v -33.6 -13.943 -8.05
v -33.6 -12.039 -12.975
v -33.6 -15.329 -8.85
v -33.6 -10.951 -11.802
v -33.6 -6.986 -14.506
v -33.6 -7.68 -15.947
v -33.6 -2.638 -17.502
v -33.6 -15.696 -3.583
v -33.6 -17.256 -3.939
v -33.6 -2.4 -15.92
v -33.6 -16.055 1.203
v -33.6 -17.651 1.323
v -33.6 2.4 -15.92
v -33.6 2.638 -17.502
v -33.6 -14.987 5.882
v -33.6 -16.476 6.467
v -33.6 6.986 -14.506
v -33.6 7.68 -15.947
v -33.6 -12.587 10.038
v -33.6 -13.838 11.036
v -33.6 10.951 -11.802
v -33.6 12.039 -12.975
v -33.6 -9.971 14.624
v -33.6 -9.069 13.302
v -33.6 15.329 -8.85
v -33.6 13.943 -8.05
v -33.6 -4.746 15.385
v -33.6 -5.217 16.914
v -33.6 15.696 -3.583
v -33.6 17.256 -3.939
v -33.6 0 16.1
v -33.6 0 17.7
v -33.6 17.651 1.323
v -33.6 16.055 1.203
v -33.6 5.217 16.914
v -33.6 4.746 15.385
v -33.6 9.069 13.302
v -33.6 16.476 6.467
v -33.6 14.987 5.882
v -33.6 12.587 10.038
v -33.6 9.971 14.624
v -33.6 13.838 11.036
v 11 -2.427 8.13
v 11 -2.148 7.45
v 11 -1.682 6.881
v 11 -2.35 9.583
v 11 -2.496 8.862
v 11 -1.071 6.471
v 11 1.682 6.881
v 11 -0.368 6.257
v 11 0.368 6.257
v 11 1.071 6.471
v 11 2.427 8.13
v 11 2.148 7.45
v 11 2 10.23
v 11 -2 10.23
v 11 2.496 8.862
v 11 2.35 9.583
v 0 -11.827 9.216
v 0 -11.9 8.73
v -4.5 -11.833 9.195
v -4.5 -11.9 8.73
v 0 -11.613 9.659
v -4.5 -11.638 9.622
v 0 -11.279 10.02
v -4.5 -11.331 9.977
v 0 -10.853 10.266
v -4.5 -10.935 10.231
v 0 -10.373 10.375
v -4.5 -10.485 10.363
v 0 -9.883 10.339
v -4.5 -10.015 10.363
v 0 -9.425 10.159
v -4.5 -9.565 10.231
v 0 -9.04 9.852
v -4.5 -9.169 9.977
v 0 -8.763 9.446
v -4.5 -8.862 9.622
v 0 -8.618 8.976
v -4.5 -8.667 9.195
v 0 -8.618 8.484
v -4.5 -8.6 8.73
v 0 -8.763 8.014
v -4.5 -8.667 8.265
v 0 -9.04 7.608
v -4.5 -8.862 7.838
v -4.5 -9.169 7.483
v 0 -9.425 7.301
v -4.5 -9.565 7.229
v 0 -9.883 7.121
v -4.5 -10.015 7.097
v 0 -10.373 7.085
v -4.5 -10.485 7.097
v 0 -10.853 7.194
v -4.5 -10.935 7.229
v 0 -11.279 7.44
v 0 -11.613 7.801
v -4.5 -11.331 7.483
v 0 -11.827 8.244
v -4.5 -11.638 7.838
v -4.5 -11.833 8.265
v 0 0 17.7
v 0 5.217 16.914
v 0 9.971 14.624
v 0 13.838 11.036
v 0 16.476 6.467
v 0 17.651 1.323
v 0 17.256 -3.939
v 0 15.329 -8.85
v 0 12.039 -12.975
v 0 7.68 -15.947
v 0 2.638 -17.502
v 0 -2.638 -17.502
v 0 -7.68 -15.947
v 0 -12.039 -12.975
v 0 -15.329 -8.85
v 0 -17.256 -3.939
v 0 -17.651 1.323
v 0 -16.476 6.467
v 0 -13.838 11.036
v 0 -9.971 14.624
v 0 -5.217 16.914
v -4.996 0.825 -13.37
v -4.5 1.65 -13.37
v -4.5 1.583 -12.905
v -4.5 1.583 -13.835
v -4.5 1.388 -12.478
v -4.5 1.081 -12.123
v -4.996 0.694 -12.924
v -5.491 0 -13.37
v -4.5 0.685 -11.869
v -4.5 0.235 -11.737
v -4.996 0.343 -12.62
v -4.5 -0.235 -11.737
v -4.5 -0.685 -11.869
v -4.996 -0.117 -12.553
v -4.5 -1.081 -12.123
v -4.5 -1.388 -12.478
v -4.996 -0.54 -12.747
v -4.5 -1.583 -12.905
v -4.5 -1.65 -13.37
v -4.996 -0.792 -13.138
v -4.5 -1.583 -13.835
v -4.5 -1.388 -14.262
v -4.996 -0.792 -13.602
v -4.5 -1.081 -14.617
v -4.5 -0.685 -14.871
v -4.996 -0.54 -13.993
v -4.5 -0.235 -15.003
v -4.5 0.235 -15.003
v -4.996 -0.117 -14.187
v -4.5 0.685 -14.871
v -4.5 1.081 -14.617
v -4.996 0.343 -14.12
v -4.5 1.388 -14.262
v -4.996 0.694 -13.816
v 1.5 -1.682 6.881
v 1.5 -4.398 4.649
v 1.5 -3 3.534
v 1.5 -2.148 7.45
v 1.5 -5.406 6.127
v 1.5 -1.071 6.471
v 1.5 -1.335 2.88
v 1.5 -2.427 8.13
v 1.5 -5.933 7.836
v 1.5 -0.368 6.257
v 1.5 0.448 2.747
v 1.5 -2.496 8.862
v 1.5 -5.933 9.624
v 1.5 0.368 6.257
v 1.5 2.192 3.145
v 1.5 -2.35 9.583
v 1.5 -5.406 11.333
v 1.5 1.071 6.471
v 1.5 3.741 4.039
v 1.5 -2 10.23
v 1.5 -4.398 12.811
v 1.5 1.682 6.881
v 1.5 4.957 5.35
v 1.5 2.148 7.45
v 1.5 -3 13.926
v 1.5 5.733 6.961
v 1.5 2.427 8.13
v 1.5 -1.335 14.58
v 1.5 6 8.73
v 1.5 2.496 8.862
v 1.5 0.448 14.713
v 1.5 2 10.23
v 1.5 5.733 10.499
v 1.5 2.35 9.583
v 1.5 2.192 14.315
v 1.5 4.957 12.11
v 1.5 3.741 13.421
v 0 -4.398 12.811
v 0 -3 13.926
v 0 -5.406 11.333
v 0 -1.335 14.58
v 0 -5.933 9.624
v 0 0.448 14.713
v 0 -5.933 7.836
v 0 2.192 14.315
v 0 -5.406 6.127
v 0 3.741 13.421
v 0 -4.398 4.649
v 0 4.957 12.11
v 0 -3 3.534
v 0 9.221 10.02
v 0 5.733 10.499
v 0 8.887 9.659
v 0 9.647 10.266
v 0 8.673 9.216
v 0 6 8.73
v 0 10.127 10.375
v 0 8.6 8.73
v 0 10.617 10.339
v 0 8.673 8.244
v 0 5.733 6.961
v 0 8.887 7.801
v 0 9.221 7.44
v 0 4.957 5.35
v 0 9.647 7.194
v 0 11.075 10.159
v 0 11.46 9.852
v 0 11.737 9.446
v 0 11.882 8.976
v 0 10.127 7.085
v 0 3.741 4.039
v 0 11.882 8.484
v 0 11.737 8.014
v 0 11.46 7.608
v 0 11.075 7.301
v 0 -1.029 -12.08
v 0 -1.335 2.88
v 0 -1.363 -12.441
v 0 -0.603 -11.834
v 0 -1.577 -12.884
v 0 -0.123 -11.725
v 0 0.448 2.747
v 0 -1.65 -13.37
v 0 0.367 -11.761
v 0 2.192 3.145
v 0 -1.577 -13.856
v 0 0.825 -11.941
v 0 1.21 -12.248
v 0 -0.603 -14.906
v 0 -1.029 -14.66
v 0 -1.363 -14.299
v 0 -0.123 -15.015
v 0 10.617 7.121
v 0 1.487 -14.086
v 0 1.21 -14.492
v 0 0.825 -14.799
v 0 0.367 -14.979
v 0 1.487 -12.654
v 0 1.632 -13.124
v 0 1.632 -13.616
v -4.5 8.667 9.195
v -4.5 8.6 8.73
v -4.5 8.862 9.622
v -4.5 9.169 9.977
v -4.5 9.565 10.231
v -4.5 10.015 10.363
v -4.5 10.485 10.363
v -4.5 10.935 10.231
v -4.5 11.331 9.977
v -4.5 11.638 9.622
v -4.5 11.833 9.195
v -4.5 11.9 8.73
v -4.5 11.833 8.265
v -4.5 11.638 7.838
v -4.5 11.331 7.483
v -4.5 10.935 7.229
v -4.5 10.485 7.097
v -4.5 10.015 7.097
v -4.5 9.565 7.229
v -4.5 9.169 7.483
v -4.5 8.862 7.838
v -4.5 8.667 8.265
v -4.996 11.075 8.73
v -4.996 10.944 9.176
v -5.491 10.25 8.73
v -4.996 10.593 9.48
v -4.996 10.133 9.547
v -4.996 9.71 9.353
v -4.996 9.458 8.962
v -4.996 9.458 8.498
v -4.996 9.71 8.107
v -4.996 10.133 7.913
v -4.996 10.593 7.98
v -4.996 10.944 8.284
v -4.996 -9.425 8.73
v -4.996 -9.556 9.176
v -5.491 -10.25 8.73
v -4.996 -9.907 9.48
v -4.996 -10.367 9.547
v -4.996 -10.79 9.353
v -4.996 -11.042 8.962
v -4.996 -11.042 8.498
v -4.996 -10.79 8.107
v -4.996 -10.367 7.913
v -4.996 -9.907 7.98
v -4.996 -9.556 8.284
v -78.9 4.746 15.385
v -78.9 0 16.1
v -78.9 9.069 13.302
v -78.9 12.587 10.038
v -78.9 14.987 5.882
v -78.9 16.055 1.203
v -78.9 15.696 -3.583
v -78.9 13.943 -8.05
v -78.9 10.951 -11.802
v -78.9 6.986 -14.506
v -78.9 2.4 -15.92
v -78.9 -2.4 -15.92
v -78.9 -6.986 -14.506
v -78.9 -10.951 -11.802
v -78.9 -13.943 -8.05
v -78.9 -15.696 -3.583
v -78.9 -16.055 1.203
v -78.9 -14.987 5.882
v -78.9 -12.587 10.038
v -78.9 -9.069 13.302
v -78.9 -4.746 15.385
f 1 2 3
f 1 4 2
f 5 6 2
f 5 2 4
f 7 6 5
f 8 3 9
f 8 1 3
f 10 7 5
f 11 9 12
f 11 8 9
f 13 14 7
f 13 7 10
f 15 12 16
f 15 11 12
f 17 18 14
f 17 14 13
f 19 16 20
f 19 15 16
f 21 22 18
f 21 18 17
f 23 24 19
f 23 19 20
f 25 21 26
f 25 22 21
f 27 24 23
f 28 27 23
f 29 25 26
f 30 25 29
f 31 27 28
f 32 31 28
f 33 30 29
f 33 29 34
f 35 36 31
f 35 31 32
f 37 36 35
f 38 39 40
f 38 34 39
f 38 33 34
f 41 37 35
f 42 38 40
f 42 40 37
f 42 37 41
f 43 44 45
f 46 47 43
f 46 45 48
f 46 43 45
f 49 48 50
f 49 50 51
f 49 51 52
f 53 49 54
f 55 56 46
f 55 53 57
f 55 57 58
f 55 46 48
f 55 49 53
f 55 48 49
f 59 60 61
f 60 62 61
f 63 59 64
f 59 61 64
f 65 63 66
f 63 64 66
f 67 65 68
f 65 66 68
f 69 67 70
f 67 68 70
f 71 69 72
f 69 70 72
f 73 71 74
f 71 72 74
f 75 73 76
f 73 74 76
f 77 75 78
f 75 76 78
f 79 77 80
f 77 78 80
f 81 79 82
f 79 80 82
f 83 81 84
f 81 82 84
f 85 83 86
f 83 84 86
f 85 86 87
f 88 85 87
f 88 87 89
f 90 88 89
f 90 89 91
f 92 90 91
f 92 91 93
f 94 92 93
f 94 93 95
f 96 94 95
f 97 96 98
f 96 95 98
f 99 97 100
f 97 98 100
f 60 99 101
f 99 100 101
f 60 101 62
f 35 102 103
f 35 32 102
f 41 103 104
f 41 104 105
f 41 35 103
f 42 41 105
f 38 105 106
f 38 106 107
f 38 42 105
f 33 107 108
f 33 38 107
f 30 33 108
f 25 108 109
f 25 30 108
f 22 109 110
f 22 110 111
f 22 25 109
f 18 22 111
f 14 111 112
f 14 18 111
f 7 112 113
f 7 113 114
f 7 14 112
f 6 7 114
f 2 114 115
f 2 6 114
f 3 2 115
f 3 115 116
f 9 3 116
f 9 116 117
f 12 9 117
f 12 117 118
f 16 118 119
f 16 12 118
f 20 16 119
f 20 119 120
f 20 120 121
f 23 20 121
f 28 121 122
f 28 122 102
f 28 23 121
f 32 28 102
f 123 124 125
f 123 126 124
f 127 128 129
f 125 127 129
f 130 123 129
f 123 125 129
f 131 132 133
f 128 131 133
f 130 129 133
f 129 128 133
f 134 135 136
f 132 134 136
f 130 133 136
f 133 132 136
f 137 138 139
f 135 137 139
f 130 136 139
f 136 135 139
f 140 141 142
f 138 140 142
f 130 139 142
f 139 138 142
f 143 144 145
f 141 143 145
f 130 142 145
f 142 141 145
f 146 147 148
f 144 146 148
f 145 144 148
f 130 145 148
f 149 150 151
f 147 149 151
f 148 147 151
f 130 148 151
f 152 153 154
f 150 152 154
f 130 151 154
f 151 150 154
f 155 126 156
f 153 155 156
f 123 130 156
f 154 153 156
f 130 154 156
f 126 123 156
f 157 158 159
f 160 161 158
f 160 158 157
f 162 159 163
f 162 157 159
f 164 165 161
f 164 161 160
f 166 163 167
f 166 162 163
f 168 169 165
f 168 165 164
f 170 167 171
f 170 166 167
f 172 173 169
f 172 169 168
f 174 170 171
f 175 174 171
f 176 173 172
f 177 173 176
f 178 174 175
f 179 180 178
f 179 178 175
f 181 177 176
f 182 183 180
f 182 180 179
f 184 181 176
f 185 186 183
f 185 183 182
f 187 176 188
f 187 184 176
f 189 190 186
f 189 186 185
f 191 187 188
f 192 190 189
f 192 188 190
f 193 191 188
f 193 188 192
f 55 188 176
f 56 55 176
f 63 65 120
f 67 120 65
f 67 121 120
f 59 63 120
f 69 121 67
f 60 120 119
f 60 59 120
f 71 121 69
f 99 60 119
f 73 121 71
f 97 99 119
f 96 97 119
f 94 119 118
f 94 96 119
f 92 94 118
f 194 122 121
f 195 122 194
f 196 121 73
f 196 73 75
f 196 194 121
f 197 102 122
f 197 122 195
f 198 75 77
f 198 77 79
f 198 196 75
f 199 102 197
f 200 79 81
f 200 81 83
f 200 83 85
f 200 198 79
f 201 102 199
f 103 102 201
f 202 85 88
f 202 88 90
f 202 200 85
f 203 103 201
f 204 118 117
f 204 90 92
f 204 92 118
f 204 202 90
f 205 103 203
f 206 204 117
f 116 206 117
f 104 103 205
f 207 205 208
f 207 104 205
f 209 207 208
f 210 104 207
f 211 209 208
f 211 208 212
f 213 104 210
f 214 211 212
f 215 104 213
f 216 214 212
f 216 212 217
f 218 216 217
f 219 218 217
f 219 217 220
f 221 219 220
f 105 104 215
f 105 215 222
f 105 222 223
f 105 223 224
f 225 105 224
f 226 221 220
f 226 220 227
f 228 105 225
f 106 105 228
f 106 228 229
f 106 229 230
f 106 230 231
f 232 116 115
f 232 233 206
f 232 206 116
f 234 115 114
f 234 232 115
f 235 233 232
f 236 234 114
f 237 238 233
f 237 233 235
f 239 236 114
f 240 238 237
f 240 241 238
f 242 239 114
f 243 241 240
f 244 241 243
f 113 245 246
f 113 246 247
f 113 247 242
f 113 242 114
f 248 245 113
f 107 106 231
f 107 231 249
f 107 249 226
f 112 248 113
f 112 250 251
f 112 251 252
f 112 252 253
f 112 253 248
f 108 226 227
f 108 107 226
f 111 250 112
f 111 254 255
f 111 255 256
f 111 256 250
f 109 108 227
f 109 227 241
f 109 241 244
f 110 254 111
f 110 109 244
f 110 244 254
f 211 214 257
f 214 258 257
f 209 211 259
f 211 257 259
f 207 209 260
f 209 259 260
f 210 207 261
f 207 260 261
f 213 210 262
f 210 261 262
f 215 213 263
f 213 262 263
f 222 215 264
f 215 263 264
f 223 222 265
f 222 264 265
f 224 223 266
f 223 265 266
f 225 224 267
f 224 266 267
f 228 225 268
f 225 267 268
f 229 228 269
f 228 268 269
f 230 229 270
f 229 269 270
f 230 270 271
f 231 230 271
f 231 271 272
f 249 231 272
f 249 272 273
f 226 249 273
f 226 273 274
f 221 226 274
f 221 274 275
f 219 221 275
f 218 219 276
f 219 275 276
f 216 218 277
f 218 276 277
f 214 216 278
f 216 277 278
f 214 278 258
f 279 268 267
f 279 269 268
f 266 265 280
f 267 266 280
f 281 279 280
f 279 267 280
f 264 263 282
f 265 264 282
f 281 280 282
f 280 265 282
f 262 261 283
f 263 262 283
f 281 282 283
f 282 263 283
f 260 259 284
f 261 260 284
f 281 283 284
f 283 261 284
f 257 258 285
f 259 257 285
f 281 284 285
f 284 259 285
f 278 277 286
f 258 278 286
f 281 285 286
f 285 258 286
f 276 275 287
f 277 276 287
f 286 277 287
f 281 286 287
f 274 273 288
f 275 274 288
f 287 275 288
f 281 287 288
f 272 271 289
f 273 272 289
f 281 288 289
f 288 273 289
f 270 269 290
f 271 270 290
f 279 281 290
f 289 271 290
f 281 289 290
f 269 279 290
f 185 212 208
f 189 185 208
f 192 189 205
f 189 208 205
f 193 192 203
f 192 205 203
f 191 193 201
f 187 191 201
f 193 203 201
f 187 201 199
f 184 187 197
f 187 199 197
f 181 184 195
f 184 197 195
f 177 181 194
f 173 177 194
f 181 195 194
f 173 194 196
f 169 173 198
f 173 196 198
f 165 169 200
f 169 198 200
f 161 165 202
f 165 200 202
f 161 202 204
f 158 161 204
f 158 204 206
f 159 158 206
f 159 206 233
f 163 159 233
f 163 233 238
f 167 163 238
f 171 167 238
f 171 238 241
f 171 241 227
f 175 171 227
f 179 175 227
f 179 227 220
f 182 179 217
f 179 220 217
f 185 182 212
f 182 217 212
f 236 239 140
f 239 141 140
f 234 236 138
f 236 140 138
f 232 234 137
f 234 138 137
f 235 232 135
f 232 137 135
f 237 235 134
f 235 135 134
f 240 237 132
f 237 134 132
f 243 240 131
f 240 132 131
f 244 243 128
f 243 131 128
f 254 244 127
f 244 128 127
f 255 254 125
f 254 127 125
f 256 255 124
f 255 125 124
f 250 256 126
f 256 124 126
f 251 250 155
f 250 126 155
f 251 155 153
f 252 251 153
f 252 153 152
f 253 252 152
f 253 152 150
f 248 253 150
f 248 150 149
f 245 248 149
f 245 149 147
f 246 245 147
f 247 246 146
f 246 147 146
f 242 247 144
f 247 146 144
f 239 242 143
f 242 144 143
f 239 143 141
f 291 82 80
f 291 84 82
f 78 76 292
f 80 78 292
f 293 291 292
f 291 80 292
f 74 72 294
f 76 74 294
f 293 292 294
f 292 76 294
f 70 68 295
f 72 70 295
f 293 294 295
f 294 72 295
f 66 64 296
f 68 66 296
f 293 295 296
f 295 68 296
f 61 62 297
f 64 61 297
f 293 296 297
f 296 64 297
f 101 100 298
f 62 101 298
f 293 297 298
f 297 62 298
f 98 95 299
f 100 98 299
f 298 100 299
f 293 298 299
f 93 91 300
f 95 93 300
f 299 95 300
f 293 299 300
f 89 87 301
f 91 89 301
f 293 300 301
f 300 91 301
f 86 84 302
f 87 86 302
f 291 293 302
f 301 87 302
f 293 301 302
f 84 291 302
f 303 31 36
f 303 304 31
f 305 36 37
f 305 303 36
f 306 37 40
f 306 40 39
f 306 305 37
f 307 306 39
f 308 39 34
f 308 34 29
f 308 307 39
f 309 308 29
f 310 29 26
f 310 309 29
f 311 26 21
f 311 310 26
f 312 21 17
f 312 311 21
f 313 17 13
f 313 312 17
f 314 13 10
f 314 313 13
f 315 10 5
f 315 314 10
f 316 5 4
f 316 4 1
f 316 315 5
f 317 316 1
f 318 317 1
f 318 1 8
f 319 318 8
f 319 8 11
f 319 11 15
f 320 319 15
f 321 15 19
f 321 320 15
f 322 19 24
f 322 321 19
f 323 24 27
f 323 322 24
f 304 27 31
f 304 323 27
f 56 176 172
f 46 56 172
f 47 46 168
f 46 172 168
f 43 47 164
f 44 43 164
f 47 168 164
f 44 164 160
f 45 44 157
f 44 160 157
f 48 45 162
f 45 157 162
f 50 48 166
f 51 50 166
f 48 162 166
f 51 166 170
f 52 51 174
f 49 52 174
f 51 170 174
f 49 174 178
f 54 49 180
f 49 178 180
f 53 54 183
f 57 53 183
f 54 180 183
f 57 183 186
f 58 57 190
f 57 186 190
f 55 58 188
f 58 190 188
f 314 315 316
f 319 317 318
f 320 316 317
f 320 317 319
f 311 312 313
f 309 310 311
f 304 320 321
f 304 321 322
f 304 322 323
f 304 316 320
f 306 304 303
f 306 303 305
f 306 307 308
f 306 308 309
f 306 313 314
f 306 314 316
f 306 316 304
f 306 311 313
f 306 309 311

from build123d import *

# Parameters (mm, degrees)
F2_R     = 6
F3_DEPTH = 1.5
F5_DEPTH = 9.5
F6_D     = 3.3
F6_DEPTH = 4.5
F6_TIP   = 0.9914200214


with BuildPart() as f1:
    # F0 (on Front) → F1 (revolve)
    with BuildSketch(Plane.XZ):
        Polygon((-78.9, 16.1), (-78.9, 0), (0, 0), (0, 17.7), (-33.6, 17.7), (-33.6, 16.1), align=None)
    revolve(axis=Axis((-39.45, 0, 0), (-1, 0, 0)))

    # F2 (on face) → F3 (join)
    with BuildSketch(Plane.YZ):
        with Locations((0, 8.73)):
            Circle(F2_R)
    extrude(amount=F3_DEPTH)

    # F4 (on face) → F5 (join)
    with BuildSketch(Plane.YZ.offset(1.5)):
        with BuildLine():
            Line((2, 10.23), (-2, 10.23))
            ThreePointArc((-2, 10.23), (0, 6.23), (2, 10.23))
        make_face()
    extrude(amount=F5_DEPTH)

    # F6
    with Locations(Plane.YZ):
        with Locations((-10.25, 8.73), (10.25, 8.73), (0, -13.37)):
            Hole(F6_D / 2, depth=F6_DEPTH)
            with Locations((0, 0, -(F6_DEPTH + F6_TIP / 2))):  # 118° drill point
                Cone(0, F6_D / 2, F6_TIP, mode=Mode.SUBTRACT)


solid = f1.part
